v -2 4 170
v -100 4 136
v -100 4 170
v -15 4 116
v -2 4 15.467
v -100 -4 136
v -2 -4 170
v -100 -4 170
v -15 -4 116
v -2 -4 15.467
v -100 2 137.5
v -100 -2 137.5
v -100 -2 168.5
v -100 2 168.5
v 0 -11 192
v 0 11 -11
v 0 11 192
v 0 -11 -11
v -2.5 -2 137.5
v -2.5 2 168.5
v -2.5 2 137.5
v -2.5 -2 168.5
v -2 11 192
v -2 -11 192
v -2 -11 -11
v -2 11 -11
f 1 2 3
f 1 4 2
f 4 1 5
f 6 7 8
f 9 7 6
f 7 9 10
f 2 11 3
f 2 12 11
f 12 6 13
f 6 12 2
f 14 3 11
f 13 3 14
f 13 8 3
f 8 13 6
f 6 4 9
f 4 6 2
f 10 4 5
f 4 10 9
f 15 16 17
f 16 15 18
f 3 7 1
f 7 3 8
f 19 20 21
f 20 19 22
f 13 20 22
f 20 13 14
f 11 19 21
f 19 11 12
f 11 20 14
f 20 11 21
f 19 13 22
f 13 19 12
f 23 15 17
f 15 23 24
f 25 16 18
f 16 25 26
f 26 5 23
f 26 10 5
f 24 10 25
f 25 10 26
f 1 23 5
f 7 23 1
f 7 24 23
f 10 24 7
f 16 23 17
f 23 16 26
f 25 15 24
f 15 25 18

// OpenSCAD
HEIGHT = 170;
DEPTH = 100;
WIDTH = 11;
LIFT = 1;
RULER_WIDTH = 3;
RULER_HEIGHT = 30;
WALL = 2;


module holder() {
    difference() {
        translate([0, +WALL+RULER_WIDTH/2+LIFT/2])
        rotate([90, 270, 0])
        linear_extrude(WALL*2 + RULER_WIDTH+LIFT)
        polygon([
            [0, 0],
            [HEIGHT, 0],
            [HEIGHT, DEPTH],
            [HEIGHT - WALL*2 - RULER_HEIGHT, DEPTH],
            [HEIGHT - WALL*2 - RULER_HEIGHT-20, 15],
            [0, 0],
            
        ]);
        
        translate([-1000-WALL-LIFT/2, -RULER_WIDTH/2-LIFT/2, HEIGHT - RULER_HEIGHT-WALL-LIFT/2])
        cube([1000, RULER_WIDTH+LIFT, RULER_HEIGHT+LIFT]);
    }
    
    translate([-WALL, -WIDTH, -WIDTH])
    cube([WALL, WIDTH*2, HEIGHT+WIDTH*3]);
}

holder();
